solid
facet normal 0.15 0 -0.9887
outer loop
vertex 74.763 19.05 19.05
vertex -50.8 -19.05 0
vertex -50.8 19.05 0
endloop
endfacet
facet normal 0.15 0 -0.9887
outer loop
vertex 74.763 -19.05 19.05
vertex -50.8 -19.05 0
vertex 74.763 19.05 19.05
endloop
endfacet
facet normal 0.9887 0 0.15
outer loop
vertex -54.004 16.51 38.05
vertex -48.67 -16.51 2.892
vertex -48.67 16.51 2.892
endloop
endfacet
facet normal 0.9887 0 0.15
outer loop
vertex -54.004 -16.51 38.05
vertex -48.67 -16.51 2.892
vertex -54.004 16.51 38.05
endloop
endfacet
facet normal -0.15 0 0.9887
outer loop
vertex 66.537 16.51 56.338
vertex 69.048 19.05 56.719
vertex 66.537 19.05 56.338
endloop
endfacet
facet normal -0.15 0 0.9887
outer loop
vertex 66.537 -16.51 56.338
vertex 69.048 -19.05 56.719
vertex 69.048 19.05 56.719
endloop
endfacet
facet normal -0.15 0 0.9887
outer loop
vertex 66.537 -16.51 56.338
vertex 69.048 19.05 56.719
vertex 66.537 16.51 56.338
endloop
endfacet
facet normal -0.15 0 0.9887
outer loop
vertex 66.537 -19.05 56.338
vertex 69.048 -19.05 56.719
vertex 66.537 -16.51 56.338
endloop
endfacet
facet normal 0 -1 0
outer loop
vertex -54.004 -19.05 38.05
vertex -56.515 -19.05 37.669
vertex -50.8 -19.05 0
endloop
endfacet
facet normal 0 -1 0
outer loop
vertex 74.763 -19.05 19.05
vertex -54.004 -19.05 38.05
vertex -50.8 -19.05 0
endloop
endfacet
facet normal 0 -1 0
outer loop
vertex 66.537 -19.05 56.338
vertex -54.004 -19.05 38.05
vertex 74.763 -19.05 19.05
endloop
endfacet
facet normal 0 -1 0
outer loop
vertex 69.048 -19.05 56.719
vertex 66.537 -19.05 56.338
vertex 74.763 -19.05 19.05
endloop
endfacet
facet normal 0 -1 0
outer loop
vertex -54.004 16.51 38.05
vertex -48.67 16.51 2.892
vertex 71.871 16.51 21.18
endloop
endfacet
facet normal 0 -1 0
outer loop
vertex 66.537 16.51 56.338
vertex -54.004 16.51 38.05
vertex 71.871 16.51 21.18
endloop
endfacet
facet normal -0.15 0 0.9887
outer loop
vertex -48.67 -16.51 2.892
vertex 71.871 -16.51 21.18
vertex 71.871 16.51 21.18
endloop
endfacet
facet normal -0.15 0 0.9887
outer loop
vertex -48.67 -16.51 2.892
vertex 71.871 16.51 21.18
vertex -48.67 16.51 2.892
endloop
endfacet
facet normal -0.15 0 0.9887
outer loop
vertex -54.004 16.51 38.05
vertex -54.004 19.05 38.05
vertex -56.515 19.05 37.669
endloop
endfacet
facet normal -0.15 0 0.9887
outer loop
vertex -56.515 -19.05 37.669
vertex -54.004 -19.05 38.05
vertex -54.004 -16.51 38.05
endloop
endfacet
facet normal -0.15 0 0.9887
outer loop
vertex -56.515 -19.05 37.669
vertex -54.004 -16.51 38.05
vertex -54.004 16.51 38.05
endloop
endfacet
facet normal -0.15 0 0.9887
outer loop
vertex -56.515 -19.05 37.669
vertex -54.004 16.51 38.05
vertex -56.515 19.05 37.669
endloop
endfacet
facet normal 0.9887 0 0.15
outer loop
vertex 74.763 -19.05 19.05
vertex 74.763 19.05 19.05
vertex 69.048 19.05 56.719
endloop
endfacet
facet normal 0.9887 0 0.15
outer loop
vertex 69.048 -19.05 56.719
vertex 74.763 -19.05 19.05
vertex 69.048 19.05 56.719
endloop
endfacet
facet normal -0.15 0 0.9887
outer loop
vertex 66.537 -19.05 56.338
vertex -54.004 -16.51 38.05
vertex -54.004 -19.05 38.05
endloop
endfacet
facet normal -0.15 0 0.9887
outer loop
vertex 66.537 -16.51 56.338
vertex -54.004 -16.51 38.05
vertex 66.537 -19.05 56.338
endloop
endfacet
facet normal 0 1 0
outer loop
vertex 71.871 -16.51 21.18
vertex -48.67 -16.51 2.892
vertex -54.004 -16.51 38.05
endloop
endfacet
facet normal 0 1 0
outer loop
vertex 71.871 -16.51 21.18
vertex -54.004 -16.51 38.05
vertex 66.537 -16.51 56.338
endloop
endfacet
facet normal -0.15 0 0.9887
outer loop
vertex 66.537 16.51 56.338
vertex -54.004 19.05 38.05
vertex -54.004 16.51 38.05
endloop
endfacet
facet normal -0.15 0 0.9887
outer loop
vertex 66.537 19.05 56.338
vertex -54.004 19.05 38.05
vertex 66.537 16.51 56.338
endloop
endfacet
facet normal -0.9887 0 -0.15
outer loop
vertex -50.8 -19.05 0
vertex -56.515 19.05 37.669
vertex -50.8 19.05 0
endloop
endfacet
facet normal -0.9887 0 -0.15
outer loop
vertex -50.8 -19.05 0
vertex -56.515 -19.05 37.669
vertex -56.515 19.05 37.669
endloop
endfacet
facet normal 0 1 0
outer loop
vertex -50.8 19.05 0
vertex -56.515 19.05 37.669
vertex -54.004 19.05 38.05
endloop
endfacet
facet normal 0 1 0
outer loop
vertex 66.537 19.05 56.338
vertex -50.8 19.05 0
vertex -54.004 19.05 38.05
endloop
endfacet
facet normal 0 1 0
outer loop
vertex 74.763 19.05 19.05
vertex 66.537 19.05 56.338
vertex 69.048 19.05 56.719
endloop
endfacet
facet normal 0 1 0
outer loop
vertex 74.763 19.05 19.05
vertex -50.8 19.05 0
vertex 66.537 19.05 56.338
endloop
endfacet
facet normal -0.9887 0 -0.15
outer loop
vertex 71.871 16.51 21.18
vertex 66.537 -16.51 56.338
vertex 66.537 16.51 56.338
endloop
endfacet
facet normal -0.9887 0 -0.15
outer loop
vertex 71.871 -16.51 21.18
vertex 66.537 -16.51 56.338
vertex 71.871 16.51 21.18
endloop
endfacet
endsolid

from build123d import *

# Parameters (mm, degrees)
F1_DEPTH = 19.05
F2_W     = 121.92
F2_H     = 2.54
F3_DEPTH = 35.56


with BuildPart() as f1:
    # F0 (on Front) → F1 (new body, symmetric)
    with BuildSketch(Plane.XZ):
        Polygon((-56.515, 37.6689364729), (-50.8, 0), (74.7631215764, 19.05), (69.0481215764, 56.7189364729), (66.5368591448, 56.3379364729), (71.8708591448, 21.1802624315), (-48.6697375685, 2.8922624315), (-54.0037375685, 38.0499364729), align=None)
    extrude(amount=F1_DEPTH, both=True)

    # F2 (on face) → F3 (join)
    with BuildSketch(Plane(origin=(-1.524, 0, 10.0450497261), x_dir=(0.9886859967, 0, 0.15), z_dir=(-0.15, 0, 0.9886859967))):
        with Locations((13.2747513695, 17.78)):
            Rectangle(F2_W, F2_H)
        with Locations((13.2747513695, -17.78)):
            Rectangle(F2_W, F2_H)
    extrude(amount=F3_DEPTH)


solid = f1.part
